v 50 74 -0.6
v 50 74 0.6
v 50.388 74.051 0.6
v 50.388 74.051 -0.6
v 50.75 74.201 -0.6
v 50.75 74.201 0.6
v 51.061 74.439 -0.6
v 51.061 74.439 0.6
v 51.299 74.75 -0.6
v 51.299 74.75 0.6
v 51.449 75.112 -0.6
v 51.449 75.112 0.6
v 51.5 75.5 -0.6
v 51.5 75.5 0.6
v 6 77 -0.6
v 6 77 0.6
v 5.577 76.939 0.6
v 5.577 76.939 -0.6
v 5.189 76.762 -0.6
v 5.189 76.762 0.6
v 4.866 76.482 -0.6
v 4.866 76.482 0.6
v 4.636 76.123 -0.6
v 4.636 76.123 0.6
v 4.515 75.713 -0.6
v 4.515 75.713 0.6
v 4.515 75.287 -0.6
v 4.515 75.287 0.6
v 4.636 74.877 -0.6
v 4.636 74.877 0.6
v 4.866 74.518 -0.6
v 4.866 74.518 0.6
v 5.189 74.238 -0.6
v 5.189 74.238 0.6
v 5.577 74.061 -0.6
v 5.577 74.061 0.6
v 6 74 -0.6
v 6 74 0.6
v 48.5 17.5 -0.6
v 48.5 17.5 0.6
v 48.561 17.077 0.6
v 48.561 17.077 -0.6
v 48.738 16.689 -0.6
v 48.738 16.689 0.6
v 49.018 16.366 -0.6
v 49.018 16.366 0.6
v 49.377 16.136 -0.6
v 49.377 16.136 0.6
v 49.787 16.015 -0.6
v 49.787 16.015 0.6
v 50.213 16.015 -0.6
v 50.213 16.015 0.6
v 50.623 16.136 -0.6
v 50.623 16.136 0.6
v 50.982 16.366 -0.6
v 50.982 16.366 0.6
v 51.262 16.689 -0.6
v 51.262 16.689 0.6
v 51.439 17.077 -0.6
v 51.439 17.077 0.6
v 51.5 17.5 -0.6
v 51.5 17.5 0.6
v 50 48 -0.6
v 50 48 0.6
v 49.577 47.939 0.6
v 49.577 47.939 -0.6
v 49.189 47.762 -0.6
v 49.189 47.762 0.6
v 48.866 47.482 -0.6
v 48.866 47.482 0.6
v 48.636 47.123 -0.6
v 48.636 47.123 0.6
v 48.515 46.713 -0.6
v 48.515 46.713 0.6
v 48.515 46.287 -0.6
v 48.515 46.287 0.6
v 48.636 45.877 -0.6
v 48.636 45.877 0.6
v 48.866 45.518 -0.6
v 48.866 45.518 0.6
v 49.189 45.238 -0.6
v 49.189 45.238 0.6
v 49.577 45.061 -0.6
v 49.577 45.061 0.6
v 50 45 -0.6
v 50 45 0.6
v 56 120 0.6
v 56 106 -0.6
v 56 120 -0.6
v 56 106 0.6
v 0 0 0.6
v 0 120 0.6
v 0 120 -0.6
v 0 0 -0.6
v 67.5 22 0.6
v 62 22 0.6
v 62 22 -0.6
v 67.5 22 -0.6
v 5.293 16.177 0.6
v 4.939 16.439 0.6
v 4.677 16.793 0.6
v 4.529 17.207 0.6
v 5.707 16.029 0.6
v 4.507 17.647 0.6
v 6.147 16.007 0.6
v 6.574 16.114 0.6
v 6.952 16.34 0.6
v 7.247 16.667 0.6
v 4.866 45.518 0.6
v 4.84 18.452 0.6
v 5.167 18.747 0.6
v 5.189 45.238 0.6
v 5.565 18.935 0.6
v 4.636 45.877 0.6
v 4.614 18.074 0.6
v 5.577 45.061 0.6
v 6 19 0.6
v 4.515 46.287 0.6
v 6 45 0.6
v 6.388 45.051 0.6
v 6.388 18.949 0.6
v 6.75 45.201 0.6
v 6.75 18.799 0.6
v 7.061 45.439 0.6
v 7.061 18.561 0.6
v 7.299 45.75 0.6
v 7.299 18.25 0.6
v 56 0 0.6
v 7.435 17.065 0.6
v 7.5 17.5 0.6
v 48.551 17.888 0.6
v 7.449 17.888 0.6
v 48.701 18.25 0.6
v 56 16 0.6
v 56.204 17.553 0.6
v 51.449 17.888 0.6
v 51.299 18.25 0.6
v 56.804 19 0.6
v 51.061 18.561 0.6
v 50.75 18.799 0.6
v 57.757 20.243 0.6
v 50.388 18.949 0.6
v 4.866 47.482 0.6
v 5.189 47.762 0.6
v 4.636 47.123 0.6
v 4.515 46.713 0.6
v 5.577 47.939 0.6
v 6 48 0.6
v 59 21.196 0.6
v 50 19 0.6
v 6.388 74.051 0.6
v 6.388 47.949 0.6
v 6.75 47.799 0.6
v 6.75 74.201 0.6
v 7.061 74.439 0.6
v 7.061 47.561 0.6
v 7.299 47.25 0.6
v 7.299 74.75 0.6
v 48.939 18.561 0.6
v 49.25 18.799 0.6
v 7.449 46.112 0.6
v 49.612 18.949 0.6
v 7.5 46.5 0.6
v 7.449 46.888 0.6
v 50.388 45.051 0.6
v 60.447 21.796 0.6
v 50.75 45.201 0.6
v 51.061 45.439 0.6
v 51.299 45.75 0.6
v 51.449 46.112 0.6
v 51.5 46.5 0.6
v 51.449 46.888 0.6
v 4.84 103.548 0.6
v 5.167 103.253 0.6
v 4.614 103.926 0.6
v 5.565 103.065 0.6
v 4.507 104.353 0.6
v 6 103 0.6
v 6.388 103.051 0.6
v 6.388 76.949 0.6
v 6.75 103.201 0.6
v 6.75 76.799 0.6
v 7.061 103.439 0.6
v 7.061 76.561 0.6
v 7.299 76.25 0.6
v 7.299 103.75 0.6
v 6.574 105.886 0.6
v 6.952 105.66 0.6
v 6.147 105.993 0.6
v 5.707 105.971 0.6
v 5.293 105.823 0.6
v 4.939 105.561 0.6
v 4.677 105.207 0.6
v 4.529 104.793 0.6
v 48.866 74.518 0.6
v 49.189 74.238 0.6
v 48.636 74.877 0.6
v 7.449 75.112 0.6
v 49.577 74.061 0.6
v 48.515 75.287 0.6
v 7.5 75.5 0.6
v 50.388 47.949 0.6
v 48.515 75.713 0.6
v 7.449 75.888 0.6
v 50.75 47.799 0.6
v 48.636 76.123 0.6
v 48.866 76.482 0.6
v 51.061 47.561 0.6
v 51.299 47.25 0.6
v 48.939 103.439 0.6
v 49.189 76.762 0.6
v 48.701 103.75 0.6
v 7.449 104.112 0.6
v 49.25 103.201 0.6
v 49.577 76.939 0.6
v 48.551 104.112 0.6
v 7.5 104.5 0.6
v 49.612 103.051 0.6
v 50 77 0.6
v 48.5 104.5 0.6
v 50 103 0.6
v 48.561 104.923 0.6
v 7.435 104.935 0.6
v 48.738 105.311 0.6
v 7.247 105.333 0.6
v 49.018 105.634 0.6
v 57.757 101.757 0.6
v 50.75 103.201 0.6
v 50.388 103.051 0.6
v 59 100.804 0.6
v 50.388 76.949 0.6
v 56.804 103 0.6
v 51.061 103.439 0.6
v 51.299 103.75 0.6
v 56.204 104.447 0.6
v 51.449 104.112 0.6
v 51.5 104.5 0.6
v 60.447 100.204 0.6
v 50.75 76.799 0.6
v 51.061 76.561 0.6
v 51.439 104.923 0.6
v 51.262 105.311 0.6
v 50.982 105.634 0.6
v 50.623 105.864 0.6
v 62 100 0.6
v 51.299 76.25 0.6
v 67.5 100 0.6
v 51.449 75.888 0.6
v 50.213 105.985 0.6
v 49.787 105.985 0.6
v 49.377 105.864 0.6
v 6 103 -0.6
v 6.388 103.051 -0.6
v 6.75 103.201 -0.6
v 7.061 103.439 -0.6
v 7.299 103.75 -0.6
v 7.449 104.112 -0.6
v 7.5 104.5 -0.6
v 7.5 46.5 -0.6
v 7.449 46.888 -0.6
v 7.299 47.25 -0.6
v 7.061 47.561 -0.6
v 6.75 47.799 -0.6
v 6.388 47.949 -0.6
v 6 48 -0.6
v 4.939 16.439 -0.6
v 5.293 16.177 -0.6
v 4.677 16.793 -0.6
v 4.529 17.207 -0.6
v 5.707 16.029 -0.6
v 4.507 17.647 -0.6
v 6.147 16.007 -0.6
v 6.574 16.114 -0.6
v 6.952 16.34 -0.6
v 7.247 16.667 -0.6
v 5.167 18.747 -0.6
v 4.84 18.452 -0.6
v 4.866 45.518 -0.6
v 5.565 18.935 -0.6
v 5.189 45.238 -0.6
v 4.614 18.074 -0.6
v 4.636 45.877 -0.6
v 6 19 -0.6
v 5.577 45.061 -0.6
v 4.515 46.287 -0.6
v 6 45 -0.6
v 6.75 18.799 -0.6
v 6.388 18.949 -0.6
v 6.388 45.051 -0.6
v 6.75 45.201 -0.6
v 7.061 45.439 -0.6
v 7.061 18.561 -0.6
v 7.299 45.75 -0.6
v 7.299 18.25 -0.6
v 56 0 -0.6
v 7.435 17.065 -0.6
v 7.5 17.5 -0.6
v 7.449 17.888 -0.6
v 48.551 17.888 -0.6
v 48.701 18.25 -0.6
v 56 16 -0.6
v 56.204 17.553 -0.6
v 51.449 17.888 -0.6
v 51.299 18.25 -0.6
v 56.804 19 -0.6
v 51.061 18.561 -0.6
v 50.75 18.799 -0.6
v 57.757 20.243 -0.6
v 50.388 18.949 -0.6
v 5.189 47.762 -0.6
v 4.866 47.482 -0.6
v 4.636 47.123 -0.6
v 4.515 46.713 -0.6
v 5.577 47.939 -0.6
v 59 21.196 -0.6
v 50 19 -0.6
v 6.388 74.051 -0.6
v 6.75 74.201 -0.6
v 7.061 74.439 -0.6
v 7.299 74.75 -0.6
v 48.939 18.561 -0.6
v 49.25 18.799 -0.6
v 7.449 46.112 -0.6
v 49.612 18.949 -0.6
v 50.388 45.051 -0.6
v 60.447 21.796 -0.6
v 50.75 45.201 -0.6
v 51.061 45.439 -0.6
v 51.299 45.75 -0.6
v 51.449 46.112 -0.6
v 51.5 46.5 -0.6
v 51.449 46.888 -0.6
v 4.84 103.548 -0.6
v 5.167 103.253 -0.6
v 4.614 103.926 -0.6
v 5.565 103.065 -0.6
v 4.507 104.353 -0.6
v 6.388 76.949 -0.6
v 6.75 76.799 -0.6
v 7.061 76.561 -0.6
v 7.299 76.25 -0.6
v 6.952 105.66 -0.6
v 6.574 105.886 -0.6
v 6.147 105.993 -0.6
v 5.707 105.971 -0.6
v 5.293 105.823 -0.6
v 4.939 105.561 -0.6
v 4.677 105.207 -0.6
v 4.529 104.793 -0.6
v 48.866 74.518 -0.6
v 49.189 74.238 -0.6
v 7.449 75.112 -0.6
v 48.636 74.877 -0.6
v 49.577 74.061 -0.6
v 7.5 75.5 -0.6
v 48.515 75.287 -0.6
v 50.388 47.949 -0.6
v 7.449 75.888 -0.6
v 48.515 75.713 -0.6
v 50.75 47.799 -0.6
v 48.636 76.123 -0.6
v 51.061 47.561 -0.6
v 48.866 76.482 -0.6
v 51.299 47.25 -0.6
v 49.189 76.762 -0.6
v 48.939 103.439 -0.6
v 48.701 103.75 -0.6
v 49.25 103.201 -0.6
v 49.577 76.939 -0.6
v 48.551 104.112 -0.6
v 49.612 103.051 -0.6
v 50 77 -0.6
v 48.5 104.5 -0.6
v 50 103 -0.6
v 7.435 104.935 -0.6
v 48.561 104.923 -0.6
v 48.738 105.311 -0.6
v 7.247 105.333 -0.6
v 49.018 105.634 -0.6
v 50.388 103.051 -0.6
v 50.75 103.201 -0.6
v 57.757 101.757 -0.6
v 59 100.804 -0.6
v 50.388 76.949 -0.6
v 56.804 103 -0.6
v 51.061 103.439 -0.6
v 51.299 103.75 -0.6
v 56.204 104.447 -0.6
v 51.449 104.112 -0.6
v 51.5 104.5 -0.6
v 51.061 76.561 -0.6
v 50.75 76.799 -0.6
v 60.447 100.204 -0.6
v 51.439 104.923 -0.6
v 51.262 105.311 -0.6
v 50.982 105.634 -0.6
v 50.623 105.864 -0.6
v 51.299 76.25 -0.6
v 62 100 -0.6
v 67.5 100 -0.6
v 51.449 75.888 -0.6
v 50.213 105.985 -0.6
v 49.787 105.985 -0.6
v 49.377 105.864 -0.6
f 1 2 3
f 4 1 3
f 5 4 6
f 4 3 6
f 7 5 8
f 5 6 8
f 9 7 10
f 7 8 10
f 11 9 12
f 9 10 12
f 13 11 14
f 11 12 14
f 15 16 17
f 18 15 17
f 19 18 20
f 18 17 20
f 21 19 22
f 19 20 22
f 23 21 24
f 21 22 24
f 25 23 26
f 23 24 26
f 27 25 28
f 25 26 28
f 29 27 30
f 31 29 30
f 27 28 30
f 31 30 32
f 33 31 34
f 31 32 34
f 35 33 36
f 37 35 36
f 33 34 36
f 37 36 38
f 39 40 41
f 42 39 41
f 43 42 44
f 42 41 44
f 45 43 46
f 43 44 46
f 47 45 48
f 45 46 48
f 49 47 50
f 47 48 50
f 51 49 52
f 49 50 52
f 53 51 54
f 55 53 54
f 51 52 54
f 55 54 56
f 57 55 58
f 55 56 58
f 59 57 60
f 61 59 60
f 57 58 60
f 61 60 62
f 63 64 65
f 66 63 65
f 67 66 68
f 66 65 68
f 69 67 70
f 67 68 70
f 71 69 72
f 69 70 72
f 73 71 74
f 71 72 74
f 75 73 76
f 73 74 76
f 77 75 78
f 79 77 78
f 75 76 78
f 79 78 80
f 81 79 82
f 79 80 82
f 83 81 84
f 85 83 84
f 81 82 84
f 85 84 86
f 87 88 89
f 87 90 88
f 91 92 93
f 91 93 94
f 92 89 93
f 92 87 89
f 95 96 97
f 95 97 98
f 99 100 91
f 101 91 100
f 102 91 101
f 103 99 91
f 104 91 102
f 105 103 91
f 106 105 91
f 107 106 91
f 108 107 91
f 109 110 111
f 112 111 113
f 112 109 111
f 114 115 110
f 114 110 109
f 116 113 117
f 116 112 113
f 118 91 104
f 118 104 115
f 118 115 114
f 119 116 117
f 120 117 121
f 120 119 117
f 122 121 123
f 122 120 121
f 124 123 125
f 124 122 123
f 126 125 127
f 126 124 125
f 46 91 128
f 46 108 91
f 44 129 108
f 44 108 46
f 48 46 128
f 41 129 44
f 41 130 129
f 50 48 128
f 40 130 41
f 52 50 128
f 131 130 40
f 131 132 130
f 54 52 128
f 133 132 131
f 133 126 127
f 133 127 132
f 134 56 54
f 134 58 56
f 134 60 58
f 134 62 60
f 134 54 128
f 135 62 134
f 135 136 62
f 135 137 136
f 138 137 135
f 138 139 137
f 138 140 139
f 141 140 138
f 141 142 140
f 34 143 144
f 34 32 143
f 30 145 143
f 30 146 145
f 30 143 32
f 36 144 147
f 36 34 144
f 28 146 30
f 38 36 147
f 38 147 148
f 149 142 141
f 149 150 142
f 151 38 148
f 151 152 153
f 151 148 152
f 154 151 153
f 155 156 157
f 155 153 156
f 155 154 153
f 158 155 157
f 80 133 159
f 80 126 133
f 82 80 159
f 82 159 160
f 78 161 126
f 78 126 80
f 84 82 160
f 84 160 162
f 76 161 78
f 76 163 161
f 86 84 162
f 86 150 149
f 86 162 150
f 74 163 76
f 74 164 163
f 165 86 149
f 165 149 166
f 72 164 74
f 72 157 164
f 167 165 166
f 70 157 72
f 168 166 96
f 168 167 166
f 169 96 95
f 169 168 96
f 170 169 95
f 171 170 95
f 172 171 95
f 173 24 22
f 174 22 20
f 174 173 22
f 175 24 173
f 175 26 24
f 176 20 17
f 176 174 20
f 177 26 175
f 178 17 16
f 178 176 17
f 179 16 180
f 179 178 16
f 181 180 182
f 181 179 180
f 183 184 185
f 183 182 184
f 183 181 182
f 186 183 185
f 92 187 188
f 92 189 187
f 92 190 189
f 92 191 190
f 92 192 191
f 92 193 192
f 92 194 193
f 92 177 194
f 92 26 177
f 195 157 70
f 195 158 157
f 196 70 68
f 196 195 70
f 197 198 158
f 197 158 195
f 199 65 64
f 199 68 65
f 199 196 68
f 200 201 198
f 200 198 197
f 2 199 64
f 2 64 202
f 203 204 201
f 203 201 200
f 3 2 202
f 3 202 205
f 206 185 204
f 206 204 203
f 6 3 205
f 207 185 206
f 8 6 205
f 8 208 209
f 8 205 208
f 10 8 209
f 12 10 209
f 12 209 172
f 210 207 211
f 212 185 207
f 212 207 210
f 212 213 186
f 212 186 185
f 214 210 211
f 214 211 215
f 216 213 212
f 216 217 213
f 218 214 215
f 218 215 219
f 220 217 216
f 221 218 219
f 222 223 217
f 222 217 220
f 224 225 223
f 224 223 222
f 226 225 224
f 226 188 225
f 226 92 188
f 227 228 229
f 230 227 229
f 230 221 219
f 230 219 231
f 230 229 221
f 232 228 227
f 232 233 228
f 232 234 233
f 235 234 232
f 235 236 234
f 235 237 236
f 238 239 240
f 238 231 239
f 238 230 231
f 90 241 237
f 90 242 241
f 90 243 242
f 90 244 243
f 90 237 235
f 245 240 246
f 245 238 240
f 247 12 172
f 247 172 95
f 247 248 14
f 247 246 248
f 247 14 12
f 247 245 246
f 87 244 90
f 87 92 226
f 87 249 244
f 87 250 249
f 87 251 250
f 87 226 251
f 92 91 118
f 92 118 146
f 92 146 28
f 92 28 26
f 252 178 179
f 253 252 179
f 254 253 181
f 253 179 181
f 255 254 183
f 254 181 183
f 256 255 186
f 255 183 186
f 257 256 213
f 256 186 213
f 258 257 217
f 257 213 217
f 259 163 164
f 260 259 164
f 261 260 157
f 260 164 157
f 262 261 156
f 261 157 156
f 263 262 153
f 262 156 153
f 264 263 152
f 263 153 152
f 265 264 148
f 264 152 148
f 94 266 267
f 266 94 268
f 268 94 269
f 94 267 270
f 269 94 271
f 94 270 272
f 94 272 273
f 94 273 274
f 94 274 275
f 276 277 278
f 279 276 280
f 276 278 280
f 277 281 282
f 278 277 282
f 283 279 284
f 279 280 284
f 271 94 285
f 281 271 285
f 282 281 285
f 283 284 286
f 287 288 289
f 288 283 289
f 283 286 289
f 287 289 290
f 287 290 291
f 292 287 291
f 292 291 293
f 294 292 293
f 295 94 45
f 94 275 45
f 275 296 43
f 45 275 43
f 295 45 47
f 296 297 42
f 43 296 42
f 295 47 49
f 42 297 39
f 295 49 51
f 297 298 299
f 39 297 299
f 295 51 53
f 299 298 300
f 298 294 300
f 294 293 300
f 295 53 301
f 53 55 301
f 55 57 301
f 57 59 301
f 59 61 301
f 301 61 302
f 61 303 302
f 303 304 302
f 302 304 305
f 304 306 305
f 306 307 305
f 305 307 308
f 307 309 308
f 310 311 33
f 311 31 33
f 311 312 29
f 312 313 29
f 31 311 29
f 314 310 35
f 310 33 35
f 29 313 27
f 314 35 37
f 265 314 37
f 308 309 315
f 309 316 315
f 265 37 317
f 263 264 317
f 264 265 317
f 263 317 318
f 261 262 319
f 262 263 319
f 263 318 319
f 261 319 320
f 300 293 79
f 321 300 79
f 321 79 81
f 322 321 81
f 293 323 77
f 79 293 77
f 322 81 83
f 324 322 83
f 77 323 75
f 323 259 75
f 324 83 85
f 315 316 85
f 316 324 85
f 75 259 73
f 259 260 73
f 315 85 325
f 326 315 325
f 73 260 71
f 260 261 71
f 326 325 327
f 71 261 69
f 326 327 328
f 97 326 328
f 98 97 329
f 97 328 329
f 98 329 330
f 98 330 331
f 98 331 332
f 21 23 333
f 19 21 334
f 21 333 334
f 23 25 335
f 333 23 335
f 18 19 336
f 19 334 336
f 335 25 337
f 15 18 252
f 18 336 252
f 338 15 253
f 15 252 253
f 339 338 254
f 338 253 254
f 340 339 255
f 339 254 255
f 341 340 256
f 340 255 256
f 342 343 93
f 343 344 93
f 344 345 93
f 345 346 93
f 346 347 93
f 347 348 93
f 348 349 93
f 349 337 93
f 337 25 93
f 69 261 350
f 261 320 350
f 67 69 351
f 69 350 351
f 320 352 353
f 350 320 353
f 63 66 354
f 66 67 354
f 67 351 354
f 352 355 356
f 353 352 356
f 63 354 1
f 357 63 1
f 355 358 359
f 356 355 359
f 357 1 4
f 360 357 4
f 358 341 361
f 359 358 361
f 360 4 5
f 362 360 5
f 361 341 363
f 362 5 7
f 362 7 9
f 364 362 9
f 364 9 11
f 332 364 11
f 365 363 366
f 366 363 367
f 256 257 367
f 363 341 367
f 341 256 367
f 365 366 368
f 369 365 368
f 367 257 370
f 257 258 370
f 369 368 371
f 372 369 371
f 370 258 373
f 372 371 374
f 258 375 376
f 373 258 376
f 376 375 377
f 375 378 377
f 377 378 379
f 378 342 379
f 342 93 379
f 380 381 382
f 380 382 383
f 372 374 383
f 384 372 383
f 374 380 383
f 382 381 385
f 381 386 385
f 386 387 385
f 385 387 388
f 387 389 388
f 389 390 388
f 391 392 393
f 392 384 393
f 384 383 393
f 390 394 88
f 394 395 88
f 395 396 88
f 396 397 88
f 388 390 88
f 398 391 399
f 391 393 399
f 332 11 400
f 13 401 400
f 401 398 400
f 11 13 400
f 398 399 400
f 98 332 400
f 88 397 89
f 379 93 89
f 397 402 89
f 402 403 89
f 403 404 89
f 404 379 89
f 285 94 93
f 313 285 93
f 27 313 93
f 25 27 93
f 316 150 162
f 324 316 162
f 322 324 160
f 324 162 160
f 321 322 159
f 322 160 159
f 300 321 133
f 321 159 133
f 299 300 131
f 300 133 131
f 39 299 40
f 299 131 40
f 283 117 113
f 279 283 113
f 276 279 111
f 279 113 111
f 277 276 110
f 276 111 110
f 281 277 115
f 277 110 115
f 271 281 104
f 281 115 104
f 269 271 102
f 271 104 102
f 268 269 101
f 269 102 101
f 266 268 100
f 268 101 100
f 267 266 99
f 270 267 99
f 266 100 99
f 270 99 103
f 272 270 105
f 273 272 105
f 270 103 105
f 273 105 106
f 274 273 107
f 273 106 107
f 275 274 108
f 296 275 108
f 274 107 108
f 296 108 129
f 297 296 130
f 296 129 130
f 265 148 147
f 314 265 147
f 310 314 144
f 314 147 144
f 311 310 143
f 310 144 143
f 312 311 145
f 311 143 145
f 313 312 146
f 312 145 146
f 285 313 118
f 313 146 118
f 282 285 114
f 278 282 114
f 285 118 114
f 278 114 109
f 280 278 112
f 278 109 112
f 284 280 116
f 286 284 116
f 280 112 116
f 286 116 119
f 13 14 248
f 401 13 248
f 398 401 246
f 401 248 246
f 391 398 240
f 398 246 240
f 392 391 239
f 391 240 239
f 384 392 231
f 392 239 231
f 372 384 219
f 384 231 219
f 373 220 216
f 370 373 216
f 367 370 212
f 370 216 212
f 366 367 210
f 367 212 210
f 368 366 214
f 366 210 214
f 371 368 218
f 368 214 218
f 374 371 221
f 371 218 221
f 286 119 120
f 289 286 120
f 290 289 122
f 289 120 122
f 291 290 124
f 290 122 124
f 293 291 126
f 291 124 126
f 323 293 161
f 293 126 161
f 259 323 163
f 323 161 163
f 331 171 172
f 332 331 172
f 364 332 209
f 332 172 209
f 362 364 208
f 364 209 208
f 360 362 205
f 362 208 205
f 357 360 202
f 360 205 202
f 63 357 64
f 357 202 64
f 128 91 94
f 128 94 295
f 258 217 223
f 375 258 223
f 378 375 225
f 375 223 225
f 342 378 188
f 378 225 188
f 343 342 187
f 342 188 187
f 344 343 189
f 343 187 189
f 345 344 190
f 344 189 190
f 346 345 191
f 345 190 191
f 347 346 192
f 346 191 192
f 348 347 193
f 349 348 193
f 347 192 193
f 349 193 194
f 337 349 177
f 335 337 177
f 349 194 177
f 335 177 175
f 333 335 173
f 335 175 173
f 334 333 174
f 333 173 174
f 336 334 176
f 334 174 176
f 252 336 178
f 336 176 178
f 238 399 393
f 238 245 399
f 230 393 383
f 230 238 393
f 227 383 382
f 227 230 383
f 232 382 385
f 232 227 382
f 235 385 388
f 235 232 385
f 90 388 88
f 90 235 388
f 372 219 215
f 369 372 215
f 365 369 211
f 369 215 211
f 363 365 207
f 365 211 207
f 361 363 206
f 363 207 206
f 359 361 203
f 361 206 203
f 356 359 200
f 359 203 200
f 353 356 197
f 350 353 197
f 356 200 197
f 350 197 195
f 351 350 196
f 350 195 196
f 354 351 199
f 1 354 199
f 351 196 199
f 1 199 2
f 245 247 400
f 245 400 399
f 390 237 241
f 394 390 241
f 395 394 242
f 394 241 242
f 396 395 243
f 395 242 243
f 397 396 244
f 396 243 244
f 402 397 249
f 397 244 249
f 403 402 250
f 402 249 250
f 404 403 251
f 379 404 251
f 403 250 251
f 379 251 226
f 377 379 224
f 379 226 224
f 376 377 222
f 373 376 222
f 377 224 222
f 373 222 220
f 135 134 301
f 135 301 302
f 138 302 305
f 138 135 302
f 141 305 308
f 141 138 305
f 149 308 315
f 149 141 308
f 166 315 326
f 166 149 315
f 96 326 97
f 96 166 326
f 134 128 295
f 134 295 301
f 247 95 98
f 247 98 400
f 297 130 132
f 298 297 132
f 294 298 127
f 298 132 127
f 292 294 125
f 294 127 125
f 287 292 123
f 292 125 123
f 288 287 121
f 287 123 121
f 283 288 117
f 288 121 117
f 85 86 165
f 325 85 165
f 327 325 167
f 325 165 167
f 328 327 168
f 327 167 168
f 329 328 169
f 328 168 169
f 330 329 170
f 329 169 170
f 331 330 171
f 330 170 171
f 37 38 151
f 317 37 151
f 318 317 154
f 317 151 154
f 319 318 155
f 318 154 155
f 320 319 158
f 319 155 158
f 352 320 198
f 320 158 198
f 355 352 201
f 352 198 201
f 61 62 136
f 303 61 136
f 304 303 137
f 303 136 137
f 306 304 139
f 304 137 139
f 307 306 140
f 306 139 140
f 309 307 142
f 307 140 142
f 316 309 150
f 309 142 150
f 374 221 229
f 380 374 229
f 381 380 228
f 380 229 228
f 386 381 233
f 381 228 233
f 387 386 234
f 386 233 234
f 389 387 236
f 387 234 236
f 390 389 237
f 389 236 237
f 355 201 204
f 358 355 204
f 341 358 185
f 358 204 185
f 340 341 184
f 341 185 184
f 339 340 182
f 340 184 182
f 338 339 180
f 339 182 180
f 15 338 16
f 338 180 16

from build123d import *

# Parameters (mm, degrees)
F1_DEPTH = 0.6
F3_DEPTH = 1.201


# Not quite as in the source:
# - a feature names something its author has since deleted; it is built from what else it names


with BuildPart() as f1:
    # F0 (on Top) → F1 (new body, symmetric)
    with BuildSketch(Plane.XY):
        Polygon((56, 120), (0, 120), (0, 106), (0, 0), (56, 0), (56, 16), (56, 106), align=None)
        with BuildLine():
            ThreePointArc((62, 100), (57.7573593129, 101.7573593129), (56, 106))
            Line((56, 106), (56, 16))
            ThreePointArc((56, 16), (57.7573593129, 20.2426406871), (62, 22))
            Line((62, 22), (67.5, 22))
            Line((67.5, 22), (67.5, 100))
            Line((67.5, 100), (62, 100))
        make_face()
    extrude(amount=F1_DEPTH, both=True)

    # F2 (on face) → F3 (cut, through all)
    with BuildSketch(Plane.XY.offset(0.6)):
        with BuildLine():
            Line((6, 103), (6, 104.5))
            Line((6, 104.5), (7.5, 104.5))
            ThreePointArc((7.5, 104.5), (4.9393398282, 105.5606601718), (6, 103))
        make_face()
        with BuildLine():
            Line((7.5, 104.5), (6, 104.5))
            Line((6, 104.5), (6, 103))
            ThreePointArc((6, 103), (7.0606601718, 103.4393398282), (7.5, 104.5))
        make_face()
        with BuildLine():
            ThreePointArc((51.5, 104.5), (50, 106), (48.5, 104.5))
            Line((48.5, 104.5), (50, 104.5))
            Line((50, 104.5), (50, 103))
            ThreePointArc((50, 103), (51.0606601718, 103.4393398282), (51.5, 104.5))
        make_face()
        with BuildLine():
            Line((50, 104.5), (48.5, 104.5))
            ThreePointArc((48.5, 104.5), (48.9393398282, 103.4393398282), (50, 103))
            Line((50, 103), (50, 104.5))
        make_face()
        with BuildLine():
            ThreePointArc((51.5, 75.5), (51.0606601718, 76.5606601718), (50, 77))
            Line((50, 77), (50, 75.5))
            Line((50, 75.5), (50, 74))
            ThreePointArc((50, 74), (51.0606601718, 74.4393398282), (51.5, 75.5))
        make_face()
        with BuildLine():
            Line((50, 75.5), (50, 77))
            ThreePointArc((50, 77), (48.5, 75.5), (50, 74))
            Line((50, 74), (50, 75.5))
        make_face()
        with BuildLine():
            ThreePointArc((51.5, 46.5), (51.0606601718, 47.5606601718), (50, 48))
            Line((50, 48), (50, 46.5))
            Line((50, 46.5), (50, 45))
            ThreePointArc((50, 45), (51.0606601718, 45.4393398282), (51.5, 46.5))
        make_face()
        with BuildLine():
            Line((50, 46.5), (50, 48))
            ThreePointArc((50, 48), (48.5, 46.5), (50, 45))
            Line((50, 45), (50, 46.5))
        make_face()
        with BuildLine():
            ThreePointArc((51.5, 17.5), (51.0606601718, 18.5606601718), (50, 19))
            Line((50, 19), (50, 17.5))
            Line((50, 17.5), (48.5, 17.5))
            ThreePointArc((48.5, 17.5), (50, 16), (51.5, 17.5))
        make_face()
        with BuildLine():
            Line((50, 17.5), (50, 19))
            ThreePointArc((50, 19), (48.9393398282, 18.5606601718), (48.5, 17.5))
            Line((48.5, 17.5), (50, 17.5))
        make_face()
        with BuildLine():
            Line((6, 17.5), (6, 19))
            ThreePointArc((6, 19), (4.9393398282, 16.4393398282), (7.5, 17.5))
            Line((7.5, 17.5), (6, 17.5))
        make_face()
        with BuildLine():
            ThreePointArc((7.5, 17.5), (7.0606601718, 18.5606601718), (6, 19))
            Line((6, 19), (6, 17.5))
            Line((6, 17.5), (7.5, 17.5))
        make_face()
        with BuildLine():
            Line((6, 46.5), (6, 48))
            ThreePointArc((6, 48), (4.5, 46.5), (6, 45))
            Line((6, 45), (6, 46.5))
        make_face()
        with BuildLine():
            ThreePointArc((7.5, 46.5), (7.0606601718, 47.5606601718), (6, 48))
            Line((6, 48), (6, 46.5))
            Line((6, 46.5), (6, 45))
            ThreePointArc((6, 45), (7.0606601718, 45.4393398282), (7.5, 46.5))
        make_face()
        with BuildLine():
            Line((6, 75.5), (6, 77))
            ThreePointArc((6, 77), (4.5, 75.5), (6, 74))
            Line((6, 74), (6, 75.5))
        make_face()
        with BuildLine():
            ThreePointArc((7.5, 75.5), (7.0606601718, 76.5606601718), (6, 77))
            Line((6, 77), (6, 75.5))
            Line((6, 75.5), (6, 74))
            ThreePointArc((6, 74), (7.0606601718, 74.4393398282), (7.5, 75.5))
        make_face()
    extrude(amount=-F3_DEPTH, mode=Mode.SUBTRACT)


solid = f1.part
